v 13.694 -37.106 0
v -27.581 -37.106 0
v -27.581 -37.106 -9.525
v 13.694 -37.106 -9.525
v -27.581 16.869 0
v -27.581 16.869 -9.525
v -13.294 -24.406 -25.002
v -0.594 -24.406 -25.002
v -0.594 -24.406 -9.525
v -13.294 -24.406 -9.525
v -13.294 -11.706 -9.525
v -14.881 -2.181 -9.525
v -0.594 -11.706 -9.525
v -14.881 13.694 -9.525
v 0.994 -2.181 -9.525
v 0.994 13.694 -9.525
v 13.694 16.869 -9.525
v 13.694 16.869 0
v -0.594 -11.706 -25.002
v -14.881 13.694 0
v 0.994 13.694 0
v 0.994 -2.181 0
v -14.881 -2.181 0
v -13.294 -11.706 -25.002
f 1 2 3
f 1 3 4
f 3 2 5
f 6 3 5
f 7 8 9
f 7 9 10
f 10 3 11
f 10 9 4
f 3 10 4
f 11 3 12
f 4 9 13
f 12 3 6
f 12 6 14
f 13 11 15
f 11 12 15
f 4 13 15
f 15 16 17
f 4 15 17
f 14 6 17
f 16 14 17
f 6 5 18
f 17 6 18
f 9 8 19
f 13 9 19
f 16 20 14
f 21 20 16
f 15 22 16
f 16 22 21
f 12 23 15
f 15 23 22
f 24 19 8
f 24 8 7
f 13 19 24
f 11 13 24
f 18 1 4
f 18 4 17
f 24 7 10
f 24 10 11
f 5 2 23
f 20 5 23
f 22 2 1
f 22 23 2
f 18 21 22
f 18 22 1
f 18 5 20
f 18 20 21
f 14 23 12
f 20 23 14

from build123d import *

# Parameters (mm, degrees)
SKETCH1_W           = 41.275
SKETCH1_H           = 53.975
SKETCH1_W_2         = 15.875
SKETCH1_H_2         = 15.875
BOSS_EXTRUDE1_DEPTH = 9.525
SKETCH2_W           = 12.7
SKETCH2_H           = 12.7
BOSS_EXTRUDE2_DEPTH = 15.477083255


with BuildPart() as part:
    # Sketch1 → Boss-Extrude1 (new body)
    with BuildSketch(Plane.XY):
        with Locations((-6.943541269, -10.118279033)):
            Rectangle(SKETCH1_W, SKETCH1_H)
        with Locations((-6.943541269, 5.756720967)):
            Rectangle(SKETCH1_W_2, SKETCH1_H_2, mode=Mode.SUBTRACT)
    extrude(amount=-BOSS_EXTRUDE1_DEPTH)

    # Sketch2 → Boss-Extrude2 (add)
    with BuildSketch(Plane(origin=(0, 0, -9.525), x_dir=(-1, 0, 0), z_dir=(0, 0, -1))):
        with Locations((6.943541269, -18.055779033)):
            Rectangle(SKETCH2_W, SKETCH2_H)
    extrude(amount=BOSS_EXTRUDE2_DEPTH)


solid = part.part
